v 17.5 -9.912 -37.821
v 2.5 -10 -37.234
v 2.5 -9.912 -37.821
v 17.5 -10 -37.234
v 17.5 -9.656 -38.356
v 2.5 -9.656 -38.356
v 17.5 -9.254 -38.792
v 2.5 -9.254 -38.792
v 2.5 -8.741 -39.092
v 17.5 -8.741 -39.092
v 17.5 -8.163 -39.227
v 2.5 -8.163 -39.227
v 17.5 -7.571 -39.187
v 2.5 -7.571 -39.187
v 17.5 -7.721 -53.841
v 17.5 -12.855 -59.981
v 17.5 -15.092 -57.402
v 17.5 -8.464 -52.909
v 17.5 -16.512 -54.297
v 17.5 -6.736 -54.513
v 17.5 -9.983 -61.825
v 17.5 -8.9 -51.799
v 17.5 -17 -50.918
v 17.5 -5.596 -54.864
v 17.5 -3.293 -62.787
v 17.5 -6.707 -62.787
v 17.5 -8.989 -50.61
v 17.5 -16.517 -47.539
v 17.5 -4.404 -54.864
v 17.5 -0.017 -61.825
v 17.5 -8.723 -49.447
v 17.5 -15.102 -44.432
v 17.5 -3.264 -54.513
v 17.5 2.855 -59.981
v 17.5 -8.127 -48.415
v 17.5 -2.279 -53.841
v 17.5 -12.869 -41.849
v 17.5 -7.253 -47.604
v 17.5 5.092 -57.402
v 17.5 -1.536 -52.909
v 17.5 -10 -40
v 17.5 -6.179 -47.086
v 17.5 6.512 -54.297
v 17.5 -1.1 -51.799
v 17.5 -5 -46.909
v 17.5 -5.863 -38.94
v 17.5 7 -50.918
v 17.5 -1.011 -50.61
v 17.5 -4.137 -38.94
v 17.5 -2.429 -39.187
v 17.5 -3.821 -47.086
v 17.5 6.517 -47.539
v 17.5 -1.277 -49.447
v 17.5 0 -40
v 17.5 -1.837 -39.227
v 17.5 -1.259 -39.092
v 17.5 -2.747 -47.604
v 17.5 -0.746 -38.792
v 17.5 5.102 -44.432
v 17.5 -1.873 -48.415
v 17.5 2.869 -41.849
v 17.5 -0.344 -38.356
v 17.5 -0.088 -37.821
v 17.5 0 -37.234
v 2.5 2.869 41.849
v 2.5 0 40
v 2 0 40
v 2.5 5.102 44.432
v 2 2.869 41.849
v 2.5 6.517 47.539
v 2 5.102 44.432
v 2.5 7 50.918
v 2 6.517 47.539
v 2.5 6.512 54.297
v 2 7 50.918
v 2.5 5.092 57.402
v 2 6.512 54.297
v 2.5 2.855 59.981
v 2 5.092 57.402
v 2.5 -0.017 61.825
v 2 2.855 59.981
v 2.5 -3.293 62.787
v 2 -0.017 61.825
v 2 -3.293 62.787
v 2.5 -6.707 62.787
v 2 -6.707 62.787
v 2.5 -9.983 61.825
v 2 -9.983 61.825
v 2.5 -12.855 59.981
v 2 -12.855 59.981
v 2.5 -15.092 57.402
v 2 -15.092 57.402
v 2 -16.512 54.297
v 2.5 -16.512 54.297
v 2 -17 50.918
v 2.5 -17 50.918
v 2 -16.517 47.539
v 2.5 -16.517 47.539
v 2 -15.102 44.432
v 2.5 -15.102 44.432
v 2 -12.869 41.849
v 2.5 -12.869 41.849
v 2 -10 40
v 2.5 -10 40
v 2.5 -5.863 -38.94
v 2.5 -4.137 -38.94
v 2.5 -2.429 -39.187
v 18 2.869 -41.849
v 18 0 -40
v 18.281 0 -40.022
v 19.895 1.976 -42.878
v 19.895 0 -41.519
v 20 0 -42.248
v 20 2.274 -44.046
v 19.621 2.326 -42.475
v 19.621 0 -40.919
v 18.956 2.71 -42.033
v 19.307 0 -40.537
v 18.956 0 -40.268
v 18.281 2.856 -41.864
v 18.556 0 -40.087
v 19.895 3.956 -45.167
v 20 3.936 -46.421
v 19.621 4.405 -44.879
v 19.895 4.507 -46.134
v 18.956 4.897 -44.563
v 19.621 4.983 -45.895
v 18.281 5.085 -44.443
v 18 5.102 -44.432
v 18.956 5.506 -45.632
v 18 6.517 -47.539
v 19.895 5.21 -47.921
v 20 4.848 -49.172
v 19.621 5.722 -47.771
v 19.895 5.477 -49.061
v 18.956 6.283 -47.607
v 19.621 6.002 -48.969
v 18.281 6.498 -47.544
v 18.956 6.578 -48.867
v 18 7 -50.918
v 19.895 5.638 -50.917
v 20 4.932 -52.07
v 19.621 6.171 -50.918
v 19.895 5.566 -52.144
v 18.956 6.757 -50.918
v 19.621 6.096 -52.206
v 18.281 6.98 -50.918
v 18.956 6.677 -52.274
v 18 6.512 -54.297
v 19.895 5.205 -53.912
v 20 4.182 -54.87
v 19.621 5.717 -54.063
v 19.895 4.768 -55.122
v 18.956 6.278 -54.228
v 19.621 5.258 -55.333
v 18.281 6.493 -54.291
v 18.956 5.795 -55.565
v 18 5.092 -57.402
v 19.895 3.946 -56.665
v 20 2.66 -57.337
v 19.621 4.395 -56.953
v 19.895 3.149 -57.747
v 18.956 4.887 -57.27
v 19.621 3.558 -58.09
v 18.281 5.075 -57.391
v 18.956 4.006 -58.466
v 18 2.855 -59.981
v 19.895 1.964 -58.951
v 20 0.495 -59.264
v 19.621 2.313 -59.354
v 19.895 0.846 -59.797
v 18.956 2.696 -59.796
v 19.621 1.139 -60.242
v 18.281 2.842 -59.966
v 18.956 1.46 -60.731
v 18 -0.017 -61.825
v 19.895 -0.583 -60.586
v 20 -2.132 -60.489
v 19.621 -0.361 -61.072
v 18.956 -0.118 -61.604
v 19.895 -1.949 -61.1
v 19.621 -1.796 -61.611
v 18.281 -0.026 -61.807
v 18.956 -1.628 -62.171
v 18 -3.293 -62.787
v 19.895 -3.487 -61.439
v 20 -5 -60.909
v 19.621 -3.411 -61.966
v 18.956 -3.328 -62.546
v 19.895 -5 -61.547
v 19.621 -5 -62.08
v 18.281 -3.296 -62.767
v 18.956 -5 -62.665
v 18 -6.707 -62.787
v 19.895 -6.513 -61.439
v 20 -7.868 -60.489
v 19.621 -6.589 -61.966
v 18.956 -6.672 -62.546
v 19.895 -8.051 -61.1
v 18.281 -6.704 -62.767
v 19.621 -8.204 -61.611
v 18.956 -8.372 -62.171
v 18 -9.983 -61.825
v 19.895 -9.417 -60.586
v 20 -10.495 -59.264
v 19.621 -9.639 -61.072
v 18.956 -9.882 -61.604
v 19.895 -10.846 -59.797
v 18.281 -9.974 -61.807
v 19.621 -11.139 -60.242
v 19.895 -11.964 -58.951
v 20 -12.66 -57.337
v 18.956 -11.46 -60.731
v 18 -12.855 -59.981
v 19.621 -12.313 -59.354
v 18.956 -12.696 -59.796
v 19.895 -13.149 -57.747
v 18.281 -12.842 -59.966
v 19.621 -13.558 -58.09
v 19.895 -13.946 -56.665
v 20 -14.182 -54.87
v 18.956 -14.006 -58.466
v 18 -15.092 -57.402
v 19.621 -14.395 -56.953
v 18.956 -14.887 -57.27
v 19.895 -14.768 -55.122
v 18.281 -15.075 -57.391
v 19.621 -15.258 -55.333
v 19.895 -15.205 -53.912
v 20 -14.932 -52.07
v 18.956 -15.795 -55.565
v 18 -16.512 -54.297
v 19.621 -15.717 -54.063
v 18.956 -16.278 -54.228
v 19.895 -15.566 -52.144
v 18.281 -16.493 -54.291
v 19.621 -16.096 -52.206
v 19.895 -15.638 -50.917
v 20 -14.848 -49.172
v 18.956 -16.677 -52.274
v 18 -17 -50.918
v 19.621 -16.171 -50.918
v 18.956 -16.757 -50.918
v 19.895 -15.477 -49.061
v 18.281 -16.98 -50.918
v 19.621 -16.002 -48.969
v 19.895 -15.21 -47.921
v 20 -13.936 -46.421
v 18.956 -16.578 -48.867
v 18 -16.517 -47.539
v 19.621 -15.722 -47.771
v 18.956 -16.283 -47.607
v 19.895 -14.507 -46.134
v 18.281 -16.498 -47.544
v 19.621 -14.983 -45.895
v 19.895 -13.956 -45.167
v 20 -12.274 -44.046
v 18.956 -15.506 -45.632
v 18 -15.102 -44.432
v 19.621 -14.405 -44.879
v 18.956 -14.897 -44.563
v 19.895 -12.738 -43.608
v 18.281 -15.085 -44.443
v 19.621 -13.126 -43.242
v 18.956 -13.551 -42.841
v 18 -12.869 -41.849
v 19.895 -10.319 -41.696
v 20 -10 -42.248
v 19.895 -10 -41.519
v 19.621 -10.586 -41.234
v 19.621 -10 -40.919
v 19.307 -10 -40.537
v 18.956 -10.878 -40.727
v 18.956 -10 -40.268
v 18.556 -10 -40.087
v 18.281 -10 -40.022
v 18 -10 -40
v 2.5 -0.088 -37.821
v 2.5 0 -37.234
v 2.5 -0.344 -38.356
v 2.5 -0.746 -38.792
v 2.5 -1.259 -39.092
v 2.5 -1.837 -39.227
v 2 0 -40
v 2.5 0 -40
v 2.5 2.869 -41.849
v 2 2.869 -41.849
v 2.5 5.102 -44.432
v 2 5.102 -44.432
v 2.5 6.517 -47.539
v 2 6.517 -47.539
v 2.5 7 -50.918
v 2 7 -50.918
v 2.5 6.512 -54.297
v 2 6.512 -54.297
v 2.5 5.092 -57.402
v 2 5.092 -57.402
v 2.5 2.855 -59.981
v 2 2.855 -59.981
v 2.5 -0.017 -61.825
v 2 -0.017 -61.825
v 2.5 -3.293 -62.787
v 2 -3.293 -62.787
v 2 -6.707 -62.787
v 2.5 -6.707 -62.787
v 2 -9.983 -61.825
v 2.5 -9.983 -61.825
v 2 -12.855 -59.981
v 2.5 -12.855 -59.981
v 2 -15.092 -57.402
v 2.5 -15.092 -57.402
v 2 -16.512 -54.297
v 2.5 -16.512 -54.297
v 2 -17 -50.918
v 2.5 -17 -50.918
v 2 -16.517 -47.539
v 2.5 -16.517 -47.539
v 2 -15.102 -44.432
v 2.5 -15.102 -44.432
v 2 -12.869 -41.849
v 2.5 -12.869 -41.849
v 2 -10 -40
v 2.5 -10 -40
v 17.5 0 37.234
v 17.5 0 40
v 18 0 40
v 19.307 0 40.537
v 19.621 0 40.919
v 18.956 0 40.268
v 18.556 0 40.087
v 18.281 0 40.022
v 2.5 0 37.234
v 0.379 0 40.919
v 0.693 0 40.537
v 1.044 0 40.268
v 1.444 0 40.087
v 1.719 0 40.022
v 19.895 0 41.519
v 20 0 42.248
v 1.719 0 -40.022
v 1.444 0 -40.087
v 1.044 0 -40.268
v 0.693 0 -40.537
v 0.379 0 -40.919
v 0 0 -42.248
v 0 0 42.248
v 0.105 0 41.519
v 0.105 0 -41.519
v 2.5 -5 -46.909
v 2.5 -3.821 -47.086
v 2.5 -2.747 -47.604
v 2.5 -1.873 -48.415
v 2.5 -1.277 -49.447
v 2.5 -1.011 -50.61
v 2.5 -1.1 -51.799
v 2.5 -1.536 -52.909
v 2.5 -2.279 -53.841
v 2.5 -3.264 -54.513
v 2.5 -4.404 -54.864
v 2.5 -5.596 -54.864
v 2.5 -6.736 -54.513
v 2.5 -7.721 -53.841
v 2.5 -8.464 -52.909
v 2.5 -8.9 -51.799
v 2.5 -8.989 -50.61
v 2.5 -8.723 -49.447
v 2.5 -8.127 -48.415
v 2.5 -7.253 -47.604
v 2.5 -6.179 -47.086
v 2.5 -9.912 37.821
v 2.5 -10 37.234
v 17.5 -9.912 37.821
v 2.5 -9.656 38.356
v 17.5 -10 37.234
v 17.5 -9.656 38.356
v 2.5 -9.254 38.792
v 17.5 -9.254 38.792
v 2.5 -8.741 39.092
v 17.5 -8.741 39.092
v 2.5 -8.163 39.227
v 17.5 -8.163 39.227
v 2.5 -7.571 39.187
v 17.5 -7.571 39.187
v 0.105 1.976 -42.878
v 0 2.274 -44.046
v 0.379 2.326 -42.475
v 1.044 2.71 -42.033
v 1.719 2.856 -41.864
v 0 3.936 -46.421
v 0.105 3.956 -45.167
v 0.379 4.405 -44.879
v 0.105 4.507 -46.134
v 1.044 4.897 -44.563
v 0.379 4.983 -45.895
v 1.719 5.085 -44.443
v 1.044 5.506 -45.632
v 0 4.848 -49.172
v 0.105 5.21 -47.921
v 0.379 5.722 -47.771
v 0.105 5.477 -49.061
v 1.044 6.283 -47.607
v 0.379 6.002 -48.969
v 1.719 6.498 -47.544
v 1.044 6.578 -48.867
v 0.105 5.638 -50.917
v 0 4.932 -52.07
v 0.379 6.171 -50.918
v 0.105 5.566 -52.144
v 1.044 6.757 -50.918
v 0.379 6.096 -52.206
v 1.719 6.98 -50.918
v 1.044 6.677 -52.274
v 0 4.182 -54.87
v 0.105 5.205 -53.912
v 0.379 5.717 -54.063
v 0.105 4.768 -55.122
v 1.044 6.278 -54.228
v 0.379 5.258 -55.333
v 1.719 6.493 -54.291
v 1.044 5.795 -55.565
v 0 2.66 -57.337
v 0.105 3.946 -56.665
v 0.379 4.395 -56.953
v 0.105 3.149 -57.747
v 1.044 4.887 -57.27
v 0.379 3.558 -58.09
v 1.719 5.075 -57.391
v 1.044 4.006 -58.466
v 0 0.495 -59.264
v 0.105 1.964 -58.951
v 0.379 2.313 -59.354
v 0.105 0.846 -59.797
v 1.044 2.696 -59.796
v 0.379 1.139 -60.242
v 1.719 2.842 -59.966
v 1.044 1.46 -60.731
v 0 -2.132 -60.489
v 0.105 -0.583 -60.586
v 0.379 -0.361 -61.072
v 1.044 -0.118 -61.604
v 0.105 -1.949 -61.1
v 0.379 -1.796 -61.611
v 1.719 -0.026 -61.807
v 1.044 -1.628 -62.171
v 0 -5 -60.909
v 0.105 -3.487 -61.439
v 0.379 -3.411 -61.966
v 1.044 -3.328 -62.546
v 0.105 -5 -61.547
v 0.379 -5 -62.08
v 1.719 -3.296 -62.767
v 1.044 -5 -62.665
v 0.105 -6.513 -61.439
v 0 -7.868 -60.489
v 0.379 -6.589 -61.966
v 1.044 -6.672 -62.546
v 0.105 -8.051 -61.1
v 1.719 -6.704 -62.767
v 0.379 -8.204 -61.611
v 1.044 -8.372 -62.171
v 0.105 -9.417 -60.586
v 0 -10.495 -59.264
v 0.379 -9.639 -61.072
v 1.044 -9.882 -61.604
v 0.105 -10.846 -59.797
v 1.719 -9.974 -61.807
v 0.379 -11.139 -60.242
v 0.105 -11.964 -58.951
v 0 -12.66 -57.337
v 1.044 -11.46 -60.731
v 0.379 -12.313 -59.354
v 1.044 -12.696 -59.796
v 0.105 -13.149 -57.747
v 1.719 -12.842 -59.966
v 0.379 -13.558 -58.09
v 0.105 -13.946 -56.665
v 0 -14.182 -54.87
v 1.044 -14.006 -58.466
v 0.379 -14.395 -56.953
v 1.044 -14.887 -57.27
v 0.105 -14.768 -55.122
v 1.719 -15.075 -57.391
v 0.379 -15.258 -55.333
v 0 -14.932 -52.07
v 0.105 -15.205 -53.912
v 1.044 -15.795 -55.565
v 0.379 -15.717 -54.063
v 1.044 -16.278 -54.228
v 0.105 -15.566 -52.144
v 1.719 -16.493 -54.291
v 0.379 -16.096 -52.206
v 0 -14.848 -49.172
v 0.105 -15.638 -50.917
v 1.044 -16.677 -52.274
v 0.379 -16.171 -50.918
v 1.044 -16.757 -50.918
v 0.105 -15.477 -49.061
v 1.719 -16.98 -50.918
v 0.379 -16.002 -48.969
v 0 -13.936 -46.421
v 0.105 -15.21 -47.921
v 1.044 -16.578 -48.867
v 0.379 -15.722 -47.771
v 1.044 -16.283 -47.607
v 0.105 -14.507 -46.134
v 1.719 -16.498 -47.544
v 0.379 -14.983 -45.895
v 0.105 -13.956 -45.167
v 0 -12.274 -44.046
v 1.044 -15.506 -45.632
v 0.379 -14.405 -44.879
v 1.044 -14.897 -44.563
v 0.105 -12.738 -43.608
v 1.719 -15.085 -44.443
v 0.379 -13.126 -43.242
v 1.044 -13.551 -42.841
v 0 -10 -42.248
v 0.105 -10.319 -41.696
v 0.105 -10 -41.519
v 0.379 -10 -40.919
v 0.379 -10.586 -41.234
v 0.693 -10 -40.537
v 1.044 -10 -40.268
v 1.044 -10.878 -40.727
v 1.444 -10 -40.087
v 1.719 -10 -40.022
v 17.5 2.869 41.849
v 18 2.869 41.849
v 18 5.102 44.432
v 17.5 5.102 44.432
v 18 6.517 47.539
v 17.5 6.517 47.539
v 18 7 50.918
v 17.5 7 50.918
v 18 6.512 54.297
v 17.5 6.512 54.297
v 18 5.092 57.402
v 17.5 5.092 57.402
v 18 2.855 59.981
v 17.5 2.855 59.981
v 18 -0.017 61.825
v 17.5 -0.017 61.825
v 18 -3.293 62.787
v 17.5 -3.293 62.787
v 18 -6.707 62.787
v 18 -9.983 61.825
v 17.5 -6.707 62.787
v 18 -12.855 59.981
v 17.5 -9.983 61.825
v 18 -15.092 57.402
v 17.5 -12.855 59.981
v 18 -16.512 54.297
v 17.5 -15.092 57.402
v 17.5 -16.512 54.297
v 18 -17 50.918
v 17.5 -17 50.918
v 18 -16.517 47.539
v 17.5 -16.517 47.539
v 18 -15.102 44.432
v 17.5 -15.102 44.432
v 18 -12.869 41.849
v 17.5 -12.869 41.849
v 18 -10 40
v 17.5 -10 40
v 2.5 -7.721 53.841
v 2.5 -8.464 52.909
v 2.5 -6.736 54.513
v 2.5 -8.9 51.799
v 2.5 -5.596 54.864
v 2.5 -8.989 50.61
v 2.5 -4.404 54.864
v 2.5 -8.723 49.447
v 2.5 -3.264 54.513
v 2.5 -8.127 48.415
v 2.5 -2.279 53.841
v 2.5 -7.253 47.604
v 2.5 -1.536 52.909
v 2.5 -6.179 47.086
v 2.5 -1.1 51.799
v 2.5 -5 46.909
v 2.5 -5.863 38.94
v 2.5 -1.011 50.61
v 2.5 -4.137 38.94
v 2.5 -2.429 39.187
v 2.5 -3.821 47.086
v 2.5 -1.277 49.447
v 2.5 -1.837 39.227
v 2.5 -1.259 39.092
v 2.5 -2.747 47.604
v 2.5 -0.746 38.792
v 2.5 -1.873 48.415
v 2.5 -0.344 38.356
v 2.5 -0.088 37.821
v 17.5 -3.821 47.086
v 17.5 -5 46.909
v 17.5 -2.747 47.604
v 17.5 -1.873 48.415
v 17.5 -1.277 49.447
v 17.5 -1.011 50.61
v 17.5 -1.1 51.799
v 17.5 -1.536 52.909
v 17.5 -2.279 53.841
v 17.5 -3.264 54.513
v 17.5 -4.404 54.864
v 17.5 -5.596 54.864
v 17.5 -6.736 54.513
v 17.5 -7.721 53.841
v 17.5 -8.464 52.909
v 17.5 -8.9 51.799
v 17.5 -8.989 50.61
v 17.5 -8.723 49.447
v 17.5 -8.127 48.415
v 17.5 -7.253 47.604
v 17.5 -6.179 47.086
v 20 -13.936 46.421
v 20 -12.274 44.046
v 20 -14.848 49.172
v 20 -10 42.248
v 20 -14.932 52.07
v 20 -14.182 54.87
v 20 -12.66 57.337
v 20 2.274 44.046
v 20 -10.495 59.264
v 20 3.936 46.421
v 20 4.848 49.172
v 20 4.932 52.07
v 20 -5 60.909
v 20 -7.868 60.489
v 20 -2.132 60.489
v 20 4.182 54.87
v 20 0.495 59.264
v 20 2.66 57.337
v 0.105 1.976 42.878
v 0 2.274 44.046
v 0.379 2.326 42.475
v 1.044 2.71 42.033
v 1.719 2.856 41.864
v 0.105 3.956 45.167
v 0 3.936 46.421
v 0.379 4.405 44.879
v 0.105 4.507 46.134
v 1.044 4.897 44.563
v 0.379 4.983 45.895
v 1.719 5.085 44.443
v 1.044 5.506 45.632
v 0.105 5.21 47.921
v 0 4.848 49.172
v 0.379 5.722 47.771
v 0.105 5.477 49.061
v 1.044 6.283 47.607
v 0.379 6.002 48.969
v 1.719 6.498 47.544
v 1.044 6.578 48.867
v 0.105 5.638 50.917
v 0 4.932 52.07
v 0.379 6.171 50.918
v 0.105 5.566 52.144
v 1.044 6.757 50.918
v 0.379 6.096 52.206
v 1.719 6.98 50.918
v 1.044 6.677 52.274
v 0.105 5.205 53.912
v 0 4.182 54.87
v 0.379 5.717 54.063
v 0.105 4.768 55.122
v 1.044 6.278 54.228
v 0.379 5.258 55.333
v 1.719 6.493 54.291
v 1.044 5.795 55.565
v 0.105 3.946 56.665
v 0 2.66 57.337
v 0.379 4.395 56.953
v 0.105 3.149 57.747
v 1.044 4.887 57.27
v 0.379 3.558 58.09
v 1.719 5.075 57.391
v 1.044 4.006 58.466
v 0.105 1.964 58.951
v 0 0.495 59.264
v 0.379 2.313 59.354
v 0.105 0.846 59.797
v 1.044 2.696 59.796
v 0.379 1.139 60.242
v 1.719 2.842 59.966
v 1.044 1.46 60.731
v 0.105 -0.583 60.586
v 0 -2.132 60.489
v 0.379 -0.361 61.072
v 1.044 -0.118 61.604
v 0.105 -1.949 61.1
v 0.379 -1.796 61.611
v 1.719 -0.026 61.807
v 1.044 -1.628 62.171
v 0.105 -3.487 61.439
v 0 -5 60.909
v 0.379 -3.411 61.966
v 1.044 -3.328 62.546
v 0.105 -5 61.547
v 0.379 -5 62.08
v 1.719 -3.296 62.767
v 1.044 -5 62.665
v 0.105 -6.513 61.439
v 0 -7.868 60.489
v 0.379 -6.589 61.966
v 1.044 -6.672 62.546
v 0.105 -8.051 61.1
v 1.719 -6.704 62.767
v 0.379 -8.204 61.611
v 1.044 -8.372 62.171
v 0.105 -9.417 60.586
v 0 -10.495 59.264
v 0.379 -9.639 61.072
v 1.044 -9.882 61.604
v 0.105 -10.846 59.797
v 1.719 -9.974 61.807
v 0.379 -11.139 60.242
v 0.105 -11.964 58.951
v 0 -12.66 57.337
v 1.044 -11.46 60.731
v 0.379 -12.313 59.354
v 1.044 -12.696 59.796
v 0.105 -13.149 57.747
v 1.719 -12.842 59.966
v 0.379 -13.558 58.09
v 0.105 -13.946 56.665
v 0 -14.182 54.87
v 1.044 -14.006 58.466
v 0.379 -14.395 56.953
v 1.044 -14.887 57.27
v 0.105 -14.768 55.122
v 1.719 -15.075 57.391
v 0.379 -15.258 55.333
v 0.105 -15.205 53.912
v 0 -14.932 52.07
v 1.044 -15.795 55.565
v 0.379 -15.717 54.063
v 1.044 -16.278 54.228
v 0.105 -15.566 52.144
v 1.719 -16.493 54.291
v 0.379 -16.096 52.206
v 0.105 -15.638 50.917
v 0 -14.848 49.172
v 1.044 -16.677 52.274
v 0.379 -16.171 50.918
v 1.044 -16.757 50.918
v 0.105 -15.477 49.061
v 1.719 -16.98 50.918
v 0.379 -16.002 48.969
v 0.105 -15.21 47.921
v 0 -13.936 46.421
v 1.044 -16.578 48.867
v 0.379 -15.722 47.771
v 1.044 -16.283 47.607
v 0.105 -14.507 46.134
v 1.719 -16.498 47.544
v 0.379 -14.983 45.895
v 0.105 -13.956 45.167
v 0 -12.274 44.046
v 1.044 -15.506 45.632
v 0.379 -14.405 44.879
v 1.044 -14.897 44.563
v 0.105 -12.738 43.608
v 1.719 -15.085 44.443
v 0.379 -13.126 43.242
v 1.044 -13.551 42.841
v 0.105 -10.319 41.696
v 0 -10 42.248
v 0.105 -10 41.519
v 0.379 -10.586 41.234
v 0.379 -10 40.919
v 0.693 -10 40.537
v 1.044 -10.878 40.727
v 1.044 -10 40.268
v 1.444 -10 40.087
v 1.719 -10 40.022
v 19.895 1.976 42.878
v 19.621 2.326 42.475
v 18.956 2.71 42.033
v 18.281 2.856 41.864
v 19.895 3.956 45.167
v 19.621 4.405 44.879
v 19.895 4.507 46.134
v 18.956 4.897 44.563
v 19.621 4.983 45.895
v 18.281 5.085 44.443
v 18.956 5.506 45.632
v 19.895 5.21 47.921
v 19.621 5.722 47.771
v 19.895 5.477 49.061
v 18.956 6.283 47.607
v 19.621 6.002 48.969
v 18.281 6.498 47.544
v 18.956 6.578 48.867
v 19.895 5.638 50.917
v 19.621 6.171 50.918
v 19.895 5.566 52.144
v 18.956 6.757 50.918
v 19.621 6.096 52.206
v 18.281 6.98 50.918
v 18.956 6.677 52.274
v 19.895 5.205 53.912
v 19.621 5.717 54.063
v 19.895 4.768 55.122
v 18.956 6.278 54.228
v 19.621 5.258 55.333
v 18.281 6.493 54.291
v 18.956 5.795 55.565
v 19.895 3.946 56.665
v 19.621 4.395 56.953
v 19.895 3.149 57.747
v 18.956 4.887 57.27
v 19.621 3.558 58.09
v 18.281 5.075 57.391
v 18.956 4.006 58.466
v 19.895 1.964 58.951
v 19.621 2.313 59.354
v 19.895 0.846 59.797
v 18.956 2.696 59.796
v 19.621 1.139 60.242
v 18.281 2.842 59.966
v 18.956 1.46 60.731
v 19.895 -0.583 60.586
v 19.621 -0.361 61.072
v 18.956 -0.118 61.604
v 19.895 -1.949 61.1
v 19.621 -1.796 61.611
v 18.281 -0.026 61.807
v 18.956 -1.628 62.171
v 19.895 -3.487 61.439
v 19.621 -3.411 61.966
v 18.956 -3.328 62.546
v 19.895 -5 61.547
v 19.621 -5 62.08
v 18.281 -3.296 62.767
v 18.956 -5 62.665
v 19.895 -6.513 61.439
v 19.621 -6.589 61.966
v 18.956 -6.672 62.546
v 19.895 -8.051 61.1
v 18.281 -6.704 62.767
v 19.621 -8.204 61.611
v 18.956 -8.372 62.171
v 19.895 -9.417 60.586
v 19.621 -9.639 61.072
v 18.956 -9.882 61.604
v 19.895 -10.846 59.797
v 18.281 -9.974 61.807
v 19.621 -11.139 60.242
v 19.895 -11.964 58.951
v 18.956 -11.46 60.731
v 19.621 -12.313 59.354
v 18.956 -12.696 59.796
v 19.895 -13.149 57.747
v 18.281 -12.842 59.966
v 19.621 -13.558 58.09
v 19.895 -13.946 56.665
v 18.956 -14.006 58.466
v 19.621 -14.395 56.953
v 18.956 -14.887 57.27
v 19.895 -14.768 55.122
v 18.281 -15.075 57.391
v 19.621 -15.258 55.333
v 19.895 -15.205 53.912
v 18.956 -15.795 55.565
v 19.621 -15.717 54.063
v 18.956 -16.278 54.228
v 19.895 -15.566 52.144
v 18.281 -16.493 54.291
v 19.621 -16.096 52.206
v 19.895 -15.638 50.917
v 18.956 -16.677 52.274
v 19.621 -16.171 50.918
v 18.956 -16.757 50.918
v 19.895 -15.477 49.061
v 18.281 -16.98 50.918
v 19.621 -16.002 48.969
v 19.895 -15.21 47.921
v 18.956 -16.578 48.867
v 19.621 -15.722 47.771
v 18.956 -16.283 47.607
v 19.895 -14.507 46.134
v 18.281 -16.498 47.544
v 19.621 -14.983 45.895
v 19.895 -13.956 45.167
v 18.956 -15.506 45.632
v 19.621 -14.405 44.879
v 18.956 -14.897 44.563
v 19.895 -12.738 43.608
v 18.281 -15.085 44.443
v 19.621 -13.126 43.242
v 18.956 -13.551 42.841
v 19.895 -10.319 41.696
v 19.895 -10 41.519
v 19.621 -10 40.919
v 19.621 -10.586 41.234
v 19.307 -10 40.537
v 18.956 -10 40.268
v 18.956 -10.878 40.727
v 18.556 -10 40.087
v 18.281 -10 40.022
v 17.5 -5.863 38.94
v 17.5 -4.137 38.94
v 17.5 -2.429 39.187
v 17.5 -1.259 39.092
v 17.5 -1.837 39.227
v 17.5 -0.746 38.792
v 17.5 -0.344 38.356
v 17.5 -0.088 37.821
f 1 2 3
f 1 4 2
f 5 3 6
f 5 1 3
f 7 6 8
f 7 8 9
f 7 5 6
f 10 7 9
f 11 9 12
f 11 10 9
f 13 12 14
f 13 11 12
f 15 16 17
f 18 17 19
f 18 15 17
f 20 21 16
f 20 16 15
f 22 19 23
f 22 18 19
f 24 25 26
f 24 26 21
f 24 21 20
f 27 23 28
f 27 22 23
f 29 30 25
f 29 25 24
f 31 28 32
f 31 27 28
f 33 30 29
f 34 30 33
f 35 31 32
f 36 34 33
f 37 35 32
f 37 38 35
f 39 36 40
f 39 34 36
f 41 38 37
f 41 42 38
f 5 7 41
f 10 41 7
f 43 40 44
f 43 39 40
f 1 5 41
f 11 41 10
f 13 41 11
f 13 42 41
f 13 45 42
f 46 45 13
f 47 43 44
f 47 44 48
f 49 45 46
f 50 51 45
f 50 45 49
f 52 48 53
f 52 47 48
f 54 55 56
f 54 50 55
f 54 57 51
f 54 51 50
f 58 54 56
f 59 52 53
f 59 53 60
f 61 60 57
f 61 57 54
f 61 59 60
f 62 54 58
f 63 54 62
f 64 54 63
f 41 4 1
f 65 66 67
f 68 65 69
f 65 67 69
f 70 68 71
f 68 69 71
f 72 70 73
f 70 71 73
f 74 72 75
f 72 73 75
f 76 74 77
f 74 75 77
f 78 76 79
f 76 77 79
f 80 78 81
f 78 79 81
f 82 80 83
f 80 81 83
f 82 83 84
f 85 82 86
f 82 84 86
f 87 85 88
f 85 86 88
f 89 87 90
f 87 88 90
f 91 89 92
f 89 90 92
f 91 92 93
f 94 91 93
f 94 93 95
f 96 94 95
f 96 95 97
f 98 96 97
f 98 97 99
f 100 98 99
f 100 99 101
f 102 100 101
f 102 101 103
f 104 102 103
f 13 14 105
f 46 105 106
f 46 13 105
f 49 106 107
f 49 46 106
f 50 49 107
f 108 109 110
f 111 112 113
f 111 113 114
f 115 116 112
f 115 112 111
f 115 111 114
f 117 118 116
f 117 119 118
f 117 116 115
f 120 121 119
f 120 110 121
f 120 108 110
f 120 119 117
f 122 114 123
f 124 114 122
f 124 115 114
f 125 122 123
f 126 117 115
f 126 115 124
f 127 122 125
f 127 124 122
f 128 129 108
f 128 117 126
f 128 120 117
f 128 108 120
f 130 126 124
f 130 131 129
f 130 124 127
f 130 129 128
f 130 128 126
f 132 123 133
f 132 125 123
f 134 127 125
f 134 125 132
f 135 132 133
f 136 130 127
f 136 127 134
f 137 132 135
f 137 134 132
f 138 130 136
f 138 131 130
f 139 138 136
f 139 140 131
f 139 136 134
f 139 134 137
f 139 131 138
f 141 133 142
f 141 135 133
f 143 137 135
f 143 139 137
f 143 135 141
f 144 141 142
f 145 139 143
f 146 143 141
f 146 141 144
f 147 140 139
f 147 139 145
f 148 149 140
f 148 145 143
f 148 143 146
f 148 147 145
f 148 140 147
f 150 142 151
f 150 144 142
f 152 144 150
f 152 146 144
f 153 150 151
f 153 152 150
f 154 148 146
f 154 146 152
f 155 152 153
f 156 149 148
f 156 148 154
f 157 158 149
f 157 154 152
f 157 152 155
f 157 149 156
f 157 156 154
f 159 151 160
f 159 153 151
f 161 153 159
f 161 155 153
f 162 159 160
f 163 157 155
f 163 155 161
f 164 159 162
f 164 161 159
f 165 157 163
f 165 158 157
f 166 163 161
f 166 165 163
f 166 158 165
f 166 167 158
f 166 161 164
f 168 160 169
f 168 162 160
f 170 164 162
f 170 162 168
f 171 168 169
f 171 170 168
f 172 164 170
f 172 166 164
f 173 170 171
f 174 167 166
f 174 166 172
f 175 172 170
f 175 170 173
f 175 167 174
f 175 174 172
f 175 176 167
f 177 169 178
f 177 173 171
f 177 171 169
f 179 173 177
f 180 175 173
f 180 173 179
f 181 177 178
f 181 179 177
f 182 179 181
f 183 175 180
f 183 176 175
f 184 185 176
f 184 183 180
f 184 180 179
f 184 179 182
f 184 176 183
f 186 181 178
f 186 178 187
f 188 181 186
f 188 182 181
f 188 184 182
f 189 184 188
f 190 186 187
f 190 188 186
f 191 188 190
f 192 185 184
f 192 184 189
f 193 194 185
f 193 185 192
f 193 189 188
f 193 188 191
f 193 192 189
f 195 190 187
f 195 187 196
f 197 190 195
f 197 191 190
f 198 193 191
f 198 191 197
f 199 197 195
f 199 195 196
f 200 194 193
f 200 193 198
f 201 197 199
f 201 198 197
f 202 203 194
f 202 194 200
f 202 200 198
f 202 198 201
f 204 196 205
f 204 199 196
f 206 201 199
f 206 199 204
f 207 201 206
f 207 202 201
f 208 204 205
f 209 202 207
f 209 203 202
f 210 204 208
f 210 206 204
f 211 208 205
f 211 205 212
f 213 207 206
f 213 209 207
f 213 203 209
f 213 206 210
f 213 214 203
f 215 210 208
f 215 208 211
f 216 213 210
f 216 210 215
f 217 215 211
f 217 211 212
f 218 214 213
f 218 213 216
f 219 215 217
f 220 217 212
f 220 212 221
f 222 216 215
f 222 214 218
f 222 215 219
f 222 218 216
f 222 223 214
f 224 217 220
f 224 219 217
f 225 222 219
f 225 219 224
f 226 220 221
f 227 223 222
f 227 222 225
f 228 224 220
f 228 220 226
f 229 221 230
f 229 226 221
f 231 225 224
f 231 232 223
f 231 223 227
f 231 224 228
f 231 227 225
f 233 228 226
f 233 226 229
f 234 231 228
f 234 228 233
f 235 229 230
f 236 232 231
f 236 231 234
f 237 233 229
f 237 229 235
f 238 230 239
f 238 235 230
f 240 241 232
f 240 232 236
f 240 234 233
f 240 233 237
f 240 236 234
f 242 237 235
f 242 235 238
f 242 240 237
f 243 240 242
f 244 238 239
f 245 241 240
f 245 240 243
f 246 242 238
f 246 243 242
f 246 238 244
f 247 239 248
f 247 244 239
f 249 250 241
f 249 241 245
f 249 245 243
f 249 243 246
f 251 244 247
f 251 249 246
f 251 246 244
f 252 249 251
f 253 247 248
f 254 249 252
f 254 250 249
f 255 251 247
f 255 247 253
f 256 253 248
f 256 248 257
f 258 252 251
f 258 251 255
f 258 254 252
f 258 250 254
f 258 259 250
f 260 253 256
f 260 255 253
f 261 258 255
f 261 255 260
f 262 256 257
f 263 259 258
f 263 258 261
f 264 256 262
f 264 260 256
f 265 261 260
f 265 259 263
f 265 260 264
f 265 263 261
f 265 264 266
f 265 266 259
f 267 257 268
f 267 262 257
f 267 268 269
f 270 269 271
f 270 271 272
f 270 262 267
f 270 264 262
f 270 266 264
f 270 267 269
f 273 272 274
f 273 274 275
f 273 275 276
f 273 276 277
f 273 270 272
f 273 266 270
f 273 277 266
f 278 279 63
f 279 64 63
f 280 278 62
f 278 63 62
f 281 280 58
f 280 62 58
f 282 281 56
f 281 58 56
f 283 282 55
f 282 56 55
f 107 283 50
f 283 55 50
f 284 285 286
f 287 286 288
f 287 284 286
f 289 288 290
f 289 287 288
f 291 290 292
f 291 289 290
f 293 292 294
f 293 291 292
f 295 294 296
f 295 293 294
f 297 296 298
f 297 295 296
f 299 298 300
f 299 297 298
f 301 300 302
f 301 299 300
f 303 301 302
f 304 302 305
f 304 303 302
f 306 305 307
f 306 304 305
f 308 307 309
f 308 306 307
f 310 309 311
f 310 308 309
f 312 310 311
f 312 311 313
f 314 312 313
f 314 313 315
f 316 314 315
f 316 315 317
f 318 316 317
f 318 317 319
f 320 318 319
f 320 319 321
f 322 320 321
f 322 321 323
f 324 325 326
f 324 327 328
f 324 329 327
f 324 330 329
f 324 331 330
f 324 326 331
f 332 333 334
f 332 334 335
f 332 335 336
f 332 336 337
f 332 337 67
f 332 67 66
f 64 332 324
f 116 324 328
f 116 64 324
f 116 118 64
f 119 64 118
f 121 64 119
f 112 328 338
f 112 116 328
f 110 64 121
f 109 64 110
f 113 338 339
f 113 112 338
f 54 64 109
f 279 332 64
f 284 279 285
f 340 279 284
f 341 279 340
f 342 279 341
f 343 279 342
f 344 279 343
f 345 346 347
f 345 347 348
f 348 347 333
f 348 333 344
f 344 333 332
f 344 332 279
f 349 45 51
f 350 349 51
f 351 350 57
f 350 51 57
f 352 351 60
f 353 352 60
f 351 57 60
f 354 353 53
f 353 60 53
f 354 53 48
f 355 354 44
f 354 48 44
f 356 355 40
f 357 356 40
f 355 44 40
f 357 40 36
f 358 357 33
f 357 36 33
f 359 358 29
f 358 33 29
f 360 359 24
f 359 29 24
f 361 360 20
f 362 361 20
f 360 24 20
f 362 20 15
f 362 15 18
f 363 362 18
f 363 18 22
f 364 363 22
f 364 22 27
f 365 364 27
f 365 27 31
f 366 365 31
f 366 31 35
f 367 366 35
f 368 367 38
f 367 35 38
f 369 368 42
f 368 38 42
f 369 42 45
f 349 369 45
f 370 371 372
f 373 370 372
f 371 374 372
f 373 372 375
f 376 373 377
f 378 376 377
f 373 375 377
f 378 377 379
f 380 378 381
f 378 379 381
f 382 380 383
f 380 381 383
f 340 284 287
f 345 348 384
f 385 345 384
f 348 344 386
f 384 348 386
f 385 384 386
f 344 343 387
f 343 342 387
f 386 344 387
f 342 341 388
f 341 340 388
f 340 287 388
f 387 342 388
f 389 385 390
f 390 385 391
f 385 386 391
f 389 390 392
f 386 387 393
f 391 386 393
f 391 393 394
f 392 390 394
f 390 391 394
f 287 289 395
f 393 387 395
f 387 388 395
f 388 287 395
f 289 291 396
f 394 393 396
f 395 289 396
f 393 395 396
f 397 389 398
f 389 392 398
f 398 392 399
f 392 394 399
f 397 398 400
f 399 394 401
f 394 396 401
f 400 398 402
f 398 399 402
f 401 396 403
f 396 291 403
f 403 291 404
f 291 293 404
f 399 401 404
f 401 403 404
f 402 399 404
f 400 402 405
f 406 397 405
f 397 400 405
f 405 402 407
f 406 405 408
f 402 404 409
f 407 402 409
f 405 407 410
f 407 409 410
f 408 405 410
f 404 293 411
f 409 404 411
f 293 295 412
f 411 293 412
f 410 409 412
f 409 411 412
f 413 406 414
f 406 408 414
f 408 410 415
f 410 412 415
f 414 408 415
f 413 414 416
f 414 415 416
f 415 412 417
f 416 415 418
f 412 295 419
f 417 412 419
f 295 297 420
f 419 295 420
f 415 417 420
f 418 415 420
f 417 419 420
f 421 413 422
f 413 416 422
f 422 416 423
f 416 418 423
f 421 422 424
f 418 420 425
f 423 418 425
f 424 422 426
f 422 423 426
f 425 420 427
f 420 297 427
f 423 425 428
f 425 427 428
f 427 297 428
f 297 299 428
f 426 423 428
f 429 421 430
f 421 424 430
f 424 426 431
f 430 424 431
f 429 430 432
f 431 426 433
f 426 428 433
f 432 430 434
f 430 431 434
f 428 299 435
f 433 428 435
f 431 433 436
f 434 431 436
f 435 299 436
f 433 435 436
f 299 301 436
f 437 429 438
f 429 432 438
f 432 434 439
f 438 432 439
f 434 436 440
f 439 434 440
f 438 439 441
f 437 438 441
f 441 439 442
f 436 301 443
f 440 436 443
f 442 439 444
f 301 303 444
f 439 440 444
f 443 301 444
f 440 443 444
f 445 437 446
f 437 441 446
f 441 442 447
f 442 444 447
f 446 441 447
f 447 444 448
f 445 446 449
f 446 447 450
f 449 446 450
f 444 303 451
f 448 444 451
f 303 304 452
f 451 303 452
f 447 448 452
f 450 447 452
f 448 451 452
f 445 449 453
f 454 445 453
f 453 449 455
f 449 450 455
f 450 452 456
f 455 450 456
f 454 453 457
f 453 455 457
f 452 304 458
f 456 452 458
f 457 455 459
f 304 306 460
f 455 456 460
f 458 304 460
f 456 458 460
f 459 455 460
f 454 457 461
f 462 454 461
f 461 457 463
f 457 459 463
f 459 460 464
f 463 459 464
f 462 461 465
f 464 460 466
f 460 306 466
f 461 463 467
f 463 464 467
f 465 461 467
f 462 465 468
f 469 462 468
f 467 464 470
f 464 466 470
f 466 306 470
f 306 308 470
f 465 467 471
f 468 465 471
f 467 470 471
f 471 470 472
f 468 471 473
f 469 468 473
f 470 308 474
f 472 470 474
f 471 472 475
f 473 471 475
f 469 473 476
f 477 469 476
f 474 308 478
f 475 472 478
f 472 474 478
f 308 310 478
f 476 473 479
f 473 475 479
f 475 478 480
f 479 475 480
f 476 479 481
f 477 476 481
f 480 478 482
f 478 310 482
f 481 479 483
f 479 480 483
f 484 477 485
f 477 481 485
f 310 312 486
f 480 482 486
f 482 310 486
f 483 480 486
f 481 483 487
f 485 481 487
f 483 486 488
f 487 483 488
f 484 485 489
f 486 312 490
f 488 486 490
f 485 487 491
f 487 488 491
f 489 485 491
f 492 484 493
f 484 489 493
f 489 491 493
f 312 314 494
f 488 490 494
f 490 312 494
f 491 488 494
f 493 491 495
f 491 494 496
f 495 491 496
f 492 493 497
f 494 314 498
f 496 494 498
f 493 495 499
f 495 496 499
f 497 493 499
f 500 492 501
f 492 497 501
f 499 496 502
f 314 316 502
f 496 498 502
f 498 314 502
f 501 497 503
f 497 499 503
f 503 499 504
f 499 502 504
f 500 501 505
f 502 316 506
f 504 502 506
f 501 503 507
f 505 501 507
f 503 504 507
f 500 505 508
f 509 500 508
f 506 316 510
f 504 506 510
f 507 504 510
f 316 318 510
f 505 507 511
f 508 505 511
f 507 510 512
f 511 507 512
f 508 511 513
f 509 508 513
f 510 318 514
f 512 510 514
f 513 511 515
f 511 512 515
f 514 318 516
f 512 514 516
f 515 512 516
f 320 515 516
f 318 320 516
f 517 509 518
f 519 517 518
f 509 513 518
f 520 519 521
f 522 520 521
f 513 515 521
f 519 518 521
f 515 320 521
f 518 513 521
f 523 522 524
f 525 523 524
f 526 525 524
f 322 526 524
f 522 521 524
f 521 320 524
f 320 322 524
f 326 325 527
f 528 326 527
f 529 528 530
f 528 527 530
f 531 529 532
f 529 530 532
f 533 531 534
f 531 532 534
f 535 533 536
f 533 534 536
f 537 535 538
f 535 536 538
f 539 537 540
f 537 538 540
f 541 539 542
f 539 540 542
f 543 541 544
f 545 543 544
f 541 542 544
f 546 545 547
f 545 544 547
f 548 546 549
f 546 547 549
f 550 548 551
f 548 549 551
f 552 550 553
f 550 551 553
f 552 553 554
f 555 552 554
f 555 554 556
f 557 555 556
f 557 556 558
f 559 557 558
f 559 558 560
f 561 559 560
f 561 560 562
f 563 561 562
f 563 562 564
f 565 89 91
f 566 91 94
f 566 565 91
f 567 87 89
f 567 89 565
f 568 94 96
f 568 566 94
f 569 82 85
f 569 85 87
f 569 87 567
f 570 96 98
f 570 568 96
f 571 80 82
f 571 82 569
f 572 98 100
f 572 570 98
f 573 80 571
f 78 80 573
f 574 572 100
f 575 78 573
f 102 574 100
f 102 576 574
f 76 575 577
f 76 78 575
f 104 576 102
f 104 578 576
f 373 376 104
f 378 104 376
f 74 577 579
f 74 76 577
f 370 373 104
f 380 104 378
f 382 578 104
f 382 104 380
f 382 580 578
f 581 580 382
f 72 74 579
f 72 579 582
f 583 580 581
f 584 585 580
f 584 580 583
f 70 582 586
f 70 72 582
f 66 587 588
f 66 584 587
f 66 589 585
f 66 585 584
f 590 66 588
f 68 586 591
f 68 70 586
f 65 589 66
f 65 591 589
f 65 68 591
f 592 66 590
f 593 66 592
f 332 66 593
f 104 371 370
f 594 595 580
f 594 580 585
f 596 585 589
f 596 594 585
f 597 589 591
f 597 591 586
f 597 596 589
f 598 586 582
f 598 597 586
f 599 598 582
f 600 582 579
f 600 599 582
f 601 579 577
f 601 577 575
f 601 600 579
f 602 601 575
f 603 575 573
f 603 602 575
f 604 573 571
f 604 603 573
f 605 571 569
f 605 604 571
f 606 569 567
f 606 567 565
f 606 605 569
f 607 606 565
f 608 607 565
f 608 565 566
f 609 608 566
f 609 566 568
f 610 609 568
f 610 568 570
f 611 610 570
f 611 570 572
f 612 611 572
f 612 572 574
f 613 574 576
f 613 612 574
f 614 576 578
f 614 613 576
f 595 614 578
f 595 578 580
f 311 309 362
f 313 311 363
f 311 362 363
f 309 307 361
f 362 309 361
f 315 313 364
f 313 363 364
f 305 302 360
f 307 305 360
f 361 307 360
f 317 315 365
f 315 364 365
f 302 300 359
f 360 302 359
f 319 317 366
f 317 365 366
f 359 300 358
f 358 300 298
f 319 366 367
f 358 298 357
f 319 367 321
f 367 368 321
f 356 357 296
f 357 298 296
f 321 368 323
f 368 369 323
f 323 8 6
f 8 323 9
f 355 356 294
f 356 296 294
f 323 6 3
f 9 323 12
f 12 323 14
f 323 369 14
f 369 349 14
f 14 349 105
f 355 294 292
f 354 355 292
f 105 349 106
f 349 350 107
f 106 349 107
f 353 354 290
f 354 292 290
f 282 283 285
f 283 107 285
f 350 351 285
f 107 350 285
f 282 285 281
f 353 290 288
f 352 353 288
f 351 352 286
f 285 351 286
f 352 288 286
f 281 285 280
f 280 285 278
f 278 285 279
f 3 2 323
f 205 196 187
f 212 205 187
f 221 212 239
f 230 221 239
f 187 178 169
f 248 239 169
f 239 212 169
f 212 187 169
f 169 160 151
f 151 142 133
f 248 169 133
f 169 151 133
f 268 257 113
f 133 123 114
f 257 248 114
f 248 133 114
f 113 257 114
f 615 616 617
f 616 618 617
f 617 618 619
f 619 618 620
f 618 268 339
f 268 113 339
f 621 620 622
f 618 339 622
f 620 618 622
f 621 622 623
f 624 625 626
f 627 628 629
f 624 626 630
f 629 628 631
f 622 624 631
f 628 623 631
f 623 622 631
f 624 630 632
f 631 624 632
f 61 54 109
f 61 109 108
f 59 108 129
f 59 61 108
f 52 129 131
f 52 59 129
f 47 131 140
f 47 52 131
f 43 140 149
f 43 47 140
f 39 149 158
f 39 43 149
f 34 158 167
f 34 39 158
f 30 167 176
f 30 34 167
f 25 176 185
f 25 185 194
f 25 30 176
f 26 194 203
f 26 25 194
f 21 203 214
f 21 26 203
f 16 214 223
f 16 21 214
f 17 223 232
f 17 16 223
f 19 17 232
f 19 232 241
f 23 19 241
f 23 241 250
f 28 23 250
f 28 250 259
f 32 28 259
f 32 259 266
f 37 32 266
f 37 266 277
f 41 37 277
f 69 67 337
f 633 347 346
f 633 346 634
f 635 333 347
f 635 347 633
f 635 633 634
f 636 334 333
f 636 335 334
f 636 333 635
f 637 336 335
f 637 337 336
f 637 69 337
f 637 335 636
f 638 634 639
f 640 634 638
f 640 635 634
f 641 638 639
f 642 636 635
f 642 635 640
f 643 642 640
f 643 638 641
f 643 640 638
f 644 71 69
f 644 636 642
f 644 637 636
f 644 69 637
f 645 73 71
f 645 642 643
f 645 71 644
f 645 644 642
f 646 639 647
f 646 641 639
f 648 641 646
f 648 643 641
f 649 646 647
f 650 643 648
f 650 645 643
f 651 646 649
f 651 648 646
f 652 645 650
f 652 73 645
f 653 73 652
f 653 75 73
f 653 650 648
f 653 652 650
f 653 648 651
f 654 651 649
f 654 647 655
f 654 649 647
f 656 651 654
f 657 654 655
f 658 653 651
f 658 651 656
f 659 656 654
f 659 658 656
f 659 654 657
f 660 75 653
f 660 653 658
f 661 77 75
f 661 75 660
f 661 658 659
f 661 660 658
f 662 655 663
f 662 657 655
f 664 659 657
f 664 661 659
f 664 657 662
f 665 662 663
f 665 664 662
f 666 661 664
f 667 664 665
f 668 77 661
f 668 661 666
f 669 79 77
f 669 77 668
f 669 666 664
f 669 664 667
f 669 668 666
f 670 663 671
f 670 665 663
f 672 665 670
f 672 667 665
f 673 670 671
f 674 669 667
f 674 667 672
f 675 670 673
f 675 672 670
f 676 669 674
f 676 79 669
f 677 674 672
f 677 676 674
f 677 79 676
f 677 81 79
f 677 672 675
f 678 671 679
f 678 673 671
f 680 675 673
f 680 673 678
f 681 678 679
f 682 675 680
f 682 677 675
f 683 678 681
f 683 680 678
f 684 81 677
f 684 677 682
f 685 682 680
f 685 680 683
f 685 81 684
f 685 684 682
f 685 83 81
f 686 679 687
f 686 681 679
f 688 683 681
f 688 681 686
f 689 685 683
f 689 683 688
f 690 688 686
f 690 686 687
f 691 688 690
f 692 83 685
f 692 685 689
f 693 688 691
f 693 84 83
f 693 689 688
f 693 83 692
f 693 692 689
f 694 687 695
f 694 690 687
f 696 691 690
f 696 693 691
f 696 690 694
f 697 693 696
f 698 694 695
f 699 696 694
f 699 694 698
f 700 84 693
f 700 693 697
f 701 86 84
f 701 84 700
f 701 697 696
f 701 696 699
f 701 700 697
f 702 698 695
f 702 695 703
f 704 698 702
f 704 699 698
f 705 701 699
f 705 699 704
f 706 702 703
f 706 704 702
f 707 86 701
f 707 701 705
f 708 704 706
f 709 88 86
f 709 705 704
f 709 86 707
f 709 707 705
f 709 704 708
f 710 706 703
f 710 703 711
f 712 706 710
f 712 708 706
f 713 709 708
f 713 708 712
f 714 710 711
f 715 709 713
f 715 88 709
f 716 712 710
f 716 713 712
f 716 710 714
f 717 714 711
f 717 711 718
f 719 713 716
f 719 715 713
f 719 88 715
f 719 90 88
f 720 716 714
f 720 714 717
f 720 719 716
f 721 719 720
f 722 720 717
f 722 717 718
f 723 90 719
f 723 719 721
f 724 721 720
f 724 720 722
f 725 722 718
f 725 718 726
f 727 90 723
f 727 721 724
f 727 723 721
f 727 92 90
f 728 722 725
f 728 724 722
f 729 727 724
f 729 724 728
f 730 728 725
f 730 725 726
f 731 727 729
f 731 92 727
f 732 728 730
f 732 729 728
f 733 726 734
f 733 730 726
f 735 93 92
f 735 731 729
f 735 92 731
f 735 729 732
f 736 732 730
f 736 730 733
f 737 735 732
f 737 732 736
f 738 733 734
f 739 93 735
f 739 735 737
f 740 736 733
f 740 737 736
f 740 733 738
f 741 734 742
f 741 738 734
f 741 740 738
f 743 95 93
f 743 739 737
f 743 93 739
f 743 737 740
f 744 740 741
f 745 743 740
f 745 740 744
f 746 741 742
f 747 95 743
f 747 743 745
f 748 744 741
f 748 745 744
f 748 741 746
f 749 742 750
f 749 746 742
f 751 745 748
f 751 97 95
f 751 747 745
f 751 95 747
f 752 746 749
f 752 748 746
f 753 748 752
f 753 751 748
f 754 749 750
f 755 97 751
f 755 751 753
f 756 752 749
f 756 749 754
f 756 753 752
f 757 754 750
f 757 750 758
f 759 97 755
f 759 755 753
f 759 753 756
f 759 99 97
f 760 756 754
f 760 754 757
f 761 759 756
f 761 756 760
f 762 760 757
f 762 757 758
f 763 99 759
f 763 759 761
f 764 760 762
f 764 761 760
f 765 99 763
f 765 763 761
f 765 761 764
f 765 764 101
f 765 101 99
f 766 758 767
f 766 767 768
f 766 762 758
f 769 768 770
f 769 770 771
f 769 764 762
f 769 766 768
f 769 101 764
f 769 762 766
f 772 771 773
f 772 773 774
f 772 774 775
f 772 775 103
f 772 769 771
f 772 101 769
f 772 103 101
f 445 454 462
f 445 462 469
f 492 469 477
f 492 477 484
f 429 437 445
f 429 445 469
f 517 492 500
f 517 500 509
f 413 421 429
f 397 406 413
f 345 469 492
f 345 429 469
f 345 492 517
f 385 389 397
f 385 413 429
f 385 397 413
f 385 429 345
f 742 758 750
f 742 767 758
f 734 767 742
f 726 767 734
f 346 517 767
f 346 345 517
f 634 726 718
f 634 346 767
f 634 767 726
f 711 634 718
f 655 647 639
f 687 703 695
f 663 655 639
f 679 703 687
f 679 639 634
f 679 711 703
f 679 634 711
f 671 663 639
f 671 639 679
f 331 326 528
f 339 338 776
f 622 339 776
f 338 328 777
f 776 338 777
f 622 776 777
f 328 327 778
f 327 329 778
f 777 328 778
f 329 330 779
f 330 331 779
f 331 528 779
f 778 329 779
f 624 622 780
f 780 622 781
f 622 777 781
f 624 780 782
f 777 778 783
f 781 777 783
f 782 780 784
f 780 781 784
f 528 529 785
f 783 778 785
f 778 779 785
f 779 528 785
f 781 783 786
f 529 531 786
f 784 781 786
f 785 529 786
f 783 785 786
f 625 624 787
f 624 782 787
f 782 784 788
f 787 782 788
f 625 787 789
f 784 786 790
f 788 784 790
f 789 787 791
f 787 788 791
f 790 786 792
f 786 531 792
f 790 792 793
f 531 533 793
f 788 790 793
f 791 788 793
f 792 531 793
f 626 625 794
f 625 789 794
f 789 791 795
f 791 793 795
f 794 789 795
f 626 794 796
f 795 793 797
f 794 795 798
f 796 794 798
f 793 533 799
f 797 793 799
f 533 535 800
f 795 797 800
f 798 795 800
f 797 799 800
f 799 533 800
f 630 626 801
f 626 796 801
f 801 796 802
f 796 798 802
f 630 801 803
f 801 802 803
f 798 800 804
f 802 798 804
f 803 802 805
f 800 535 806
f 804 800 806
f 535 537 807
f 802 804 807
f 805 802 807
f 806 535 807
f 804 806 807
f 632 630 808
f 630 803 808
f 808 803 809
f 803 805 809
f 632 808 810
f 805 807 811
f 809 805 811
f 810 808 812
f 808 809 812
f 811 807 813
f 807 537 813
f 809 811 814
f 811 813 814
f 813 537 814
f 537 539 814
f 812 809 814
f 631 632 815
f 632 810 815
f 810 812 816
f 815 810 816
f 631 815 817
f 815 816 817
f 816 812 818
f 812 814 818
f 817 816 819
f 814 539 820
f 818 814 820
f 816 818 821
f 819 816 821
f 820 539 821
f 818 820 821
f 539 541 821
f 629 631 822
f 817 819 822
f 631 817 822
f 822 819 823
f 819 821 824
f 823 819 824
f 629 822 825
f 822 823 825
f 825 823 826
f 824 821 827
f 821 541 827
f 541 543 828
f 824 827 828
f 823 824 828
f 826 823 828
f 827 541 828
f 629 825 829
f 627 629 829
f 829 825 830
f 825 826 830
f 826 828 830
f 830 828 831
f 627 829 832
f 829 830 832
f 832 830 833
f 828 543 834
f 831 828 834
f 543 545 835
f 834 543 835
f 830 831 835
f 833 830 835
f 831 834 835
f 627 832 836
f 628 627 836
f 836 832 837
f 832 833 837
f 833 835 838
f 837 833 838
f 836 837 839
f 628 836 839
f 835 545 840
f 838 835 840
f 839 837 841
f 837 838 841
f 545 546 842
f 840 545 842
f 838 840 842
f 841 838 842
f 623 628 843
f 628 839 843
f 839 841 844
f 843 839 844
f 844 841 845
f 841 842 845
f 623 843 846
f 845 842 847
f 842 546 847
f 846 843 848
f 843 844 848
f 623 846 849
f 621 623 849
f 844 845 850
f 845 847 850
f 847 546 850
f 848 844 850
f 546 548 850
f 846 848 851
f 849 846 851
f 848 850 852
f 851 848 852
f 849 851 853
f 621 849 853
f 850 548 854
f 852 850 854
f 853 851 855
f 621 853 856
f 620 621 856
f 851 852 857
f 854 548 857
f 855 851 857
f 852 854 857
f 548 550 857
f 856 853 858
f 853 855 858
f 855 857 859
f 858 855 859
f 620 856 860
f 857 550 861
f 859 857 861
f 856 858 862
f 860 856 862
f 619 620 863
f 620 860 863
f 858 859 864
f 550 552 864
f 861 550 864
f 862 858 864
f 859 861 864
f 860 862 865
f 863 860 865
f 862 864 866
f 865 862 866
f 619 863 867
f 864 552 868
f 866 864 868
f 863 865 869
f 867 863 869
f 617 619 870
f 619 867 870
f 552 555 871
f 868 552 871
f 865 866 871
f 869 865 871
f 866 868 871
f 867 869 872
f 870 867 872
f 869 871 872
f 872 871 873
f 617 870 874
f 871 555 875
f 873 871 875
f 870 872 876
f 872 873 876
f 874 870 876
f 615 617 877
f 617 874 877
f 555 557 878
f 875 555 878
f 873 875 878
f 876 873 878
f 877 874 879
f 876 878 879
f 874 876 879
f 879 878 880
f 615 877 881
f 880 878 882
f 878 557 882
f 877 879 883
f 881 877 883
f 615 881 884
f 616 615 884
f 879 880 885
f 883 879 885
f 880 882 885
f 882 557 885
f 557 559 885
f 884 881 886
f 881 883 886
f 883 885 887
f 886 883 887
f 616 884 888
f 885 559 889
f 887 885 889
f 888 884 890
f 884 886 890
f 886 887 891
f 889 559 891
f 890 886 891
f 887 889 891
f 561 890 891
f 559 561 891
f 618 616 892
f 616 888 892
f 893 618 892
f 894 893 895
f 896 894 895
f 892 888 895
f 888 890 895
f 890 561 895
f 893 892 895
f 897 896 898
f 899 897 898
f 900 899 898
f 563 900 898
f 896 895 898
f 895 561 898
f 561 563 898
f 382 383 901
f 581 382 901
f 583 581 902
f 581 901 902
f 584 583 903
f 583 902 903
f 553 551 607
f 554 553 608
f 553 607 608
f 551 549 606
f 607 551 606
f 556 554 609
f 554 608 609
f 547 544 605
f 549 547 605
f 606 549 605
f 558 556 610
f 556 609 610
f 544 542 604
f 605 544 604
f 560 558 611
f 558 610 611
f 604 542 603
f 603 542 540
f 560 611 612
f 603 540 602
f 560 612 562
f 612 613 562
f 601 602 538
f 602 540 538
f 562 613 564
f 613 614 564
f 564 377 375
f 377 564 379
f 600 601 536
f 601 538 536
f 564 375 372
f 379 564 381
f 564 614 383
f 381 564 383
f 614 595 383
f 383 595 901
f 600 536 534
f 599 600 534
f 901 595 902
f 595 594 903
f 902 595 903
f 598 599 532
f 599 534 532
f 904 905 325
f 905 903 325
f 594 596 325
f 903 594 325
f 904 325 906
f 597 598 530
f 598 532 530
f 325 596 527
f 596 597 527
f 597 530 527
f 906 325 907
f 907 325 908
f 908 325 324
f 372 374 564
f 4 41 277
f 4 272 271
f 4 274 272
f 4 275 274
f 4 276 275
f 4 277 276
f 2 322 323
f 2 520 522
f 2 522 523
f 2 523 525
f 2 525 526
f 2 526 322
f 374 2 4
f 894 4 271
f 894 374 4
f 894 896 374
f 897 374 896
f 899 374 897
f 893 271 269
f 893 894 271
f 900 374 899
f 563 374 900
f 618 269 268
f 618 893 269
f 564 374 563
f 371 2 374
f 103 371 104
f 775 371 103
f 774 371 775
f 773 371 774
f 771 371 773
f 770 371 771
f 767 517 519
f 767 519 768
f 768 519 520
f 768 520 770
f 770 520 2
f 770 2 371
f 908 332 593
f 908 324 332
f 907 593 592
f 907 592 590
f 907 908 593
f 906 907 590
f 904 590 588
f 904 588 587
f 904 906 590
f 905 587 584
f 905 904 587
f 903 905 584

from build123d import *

# Parameters (mm, degrees)
BOSS_EXTRUDE1_DEPTH  = 20
CUT_EXTRUDE1_START   = -2.5
SKETCH2_R            = 12
SKETCH2_R_2          = 4
CUT_EXTRUDE1_DEPTH   = 15
FILLET1_R            = 2
FILLET1_OF_MIRROR1_R = 2


with BuildPart() as part:
    # Sketch1 → Boss-Extrude1 (new body)
    with BuildSketch(Plane(origin=(0, 0, 0), x_dir=(0, 0, -1), z_dir=(1, 0, 0))):
        with BuildLine():
            Line((0, 0), (-40, 0))
            ThreePointArc((-40, 0), (-62.908712115, -5), (-40, -10))
            Line((-40, -10), (0, -10))
            Line((0, -10), (0, 0))
        make_face()
    boss_extrude1 = extrude(amount=BOSS_EXTRUDE1_DEPTH)

    # Sketch2 → Cut-Extrude1 (cut)
    with BuildSketch(Plane(origin=(20, 0, 0), x_dir=(0, 0, -1), z_dir=(1, 0, 0)).offset(CUT_EXTRUDE1_START)):
        with Locations((-50.908712115, -5)):
            Circle(SKETCH2_R)
        with Locations((-50.908712115, -5)):
            Circle(SKETCH2_R_2, mode=Mode.SUBTRACT)
    cut_extrude1 = extrude(amount=-CUT_EXTRUDE1_DEPTH, mode=Mode.SUBTRACT)

    # Fillet1
    fillet1_edges = [part.edges().sort_by_distance(p)[0] for p in [
        (0, -5, 62.908712115),
        (20, -5, 62.908712115),
        (10, -10, 40),
        (10, 0, 40),
    ]]
    fillet(fillet1_edges, radius=FILLET1_R)

    # Mirror1: Boss-Extrude1, Cut-Extrude1 across plane
    add(boss_extrude1.mirror(Plane(origin=(20, -10, 0), x_dir=(1, 0, 0), z_dir=(0, 0, 1))))
    add(cut_extrude1.mirror(Plane(origin=(20, -10, 0), x_dir=(1, 0, 0), z_dir=(0, 0, 1))), mode=Mode.SUBTRACT)

    # Fillet1 of Mirror1
    fillet1_of_mirror1_edges = [part.edges().sort_by_distance(p)[0] for p in [
        (0, -5, -62.908712115),
        (20, -5, -62.908712115),
        (10, -10, -40),
        (10, 0, -40),
    ]]
    fillet(fillet1_of_mirror1_edges, radius=FILLET1_OF_MIRROR1_R)


solid = part.part
